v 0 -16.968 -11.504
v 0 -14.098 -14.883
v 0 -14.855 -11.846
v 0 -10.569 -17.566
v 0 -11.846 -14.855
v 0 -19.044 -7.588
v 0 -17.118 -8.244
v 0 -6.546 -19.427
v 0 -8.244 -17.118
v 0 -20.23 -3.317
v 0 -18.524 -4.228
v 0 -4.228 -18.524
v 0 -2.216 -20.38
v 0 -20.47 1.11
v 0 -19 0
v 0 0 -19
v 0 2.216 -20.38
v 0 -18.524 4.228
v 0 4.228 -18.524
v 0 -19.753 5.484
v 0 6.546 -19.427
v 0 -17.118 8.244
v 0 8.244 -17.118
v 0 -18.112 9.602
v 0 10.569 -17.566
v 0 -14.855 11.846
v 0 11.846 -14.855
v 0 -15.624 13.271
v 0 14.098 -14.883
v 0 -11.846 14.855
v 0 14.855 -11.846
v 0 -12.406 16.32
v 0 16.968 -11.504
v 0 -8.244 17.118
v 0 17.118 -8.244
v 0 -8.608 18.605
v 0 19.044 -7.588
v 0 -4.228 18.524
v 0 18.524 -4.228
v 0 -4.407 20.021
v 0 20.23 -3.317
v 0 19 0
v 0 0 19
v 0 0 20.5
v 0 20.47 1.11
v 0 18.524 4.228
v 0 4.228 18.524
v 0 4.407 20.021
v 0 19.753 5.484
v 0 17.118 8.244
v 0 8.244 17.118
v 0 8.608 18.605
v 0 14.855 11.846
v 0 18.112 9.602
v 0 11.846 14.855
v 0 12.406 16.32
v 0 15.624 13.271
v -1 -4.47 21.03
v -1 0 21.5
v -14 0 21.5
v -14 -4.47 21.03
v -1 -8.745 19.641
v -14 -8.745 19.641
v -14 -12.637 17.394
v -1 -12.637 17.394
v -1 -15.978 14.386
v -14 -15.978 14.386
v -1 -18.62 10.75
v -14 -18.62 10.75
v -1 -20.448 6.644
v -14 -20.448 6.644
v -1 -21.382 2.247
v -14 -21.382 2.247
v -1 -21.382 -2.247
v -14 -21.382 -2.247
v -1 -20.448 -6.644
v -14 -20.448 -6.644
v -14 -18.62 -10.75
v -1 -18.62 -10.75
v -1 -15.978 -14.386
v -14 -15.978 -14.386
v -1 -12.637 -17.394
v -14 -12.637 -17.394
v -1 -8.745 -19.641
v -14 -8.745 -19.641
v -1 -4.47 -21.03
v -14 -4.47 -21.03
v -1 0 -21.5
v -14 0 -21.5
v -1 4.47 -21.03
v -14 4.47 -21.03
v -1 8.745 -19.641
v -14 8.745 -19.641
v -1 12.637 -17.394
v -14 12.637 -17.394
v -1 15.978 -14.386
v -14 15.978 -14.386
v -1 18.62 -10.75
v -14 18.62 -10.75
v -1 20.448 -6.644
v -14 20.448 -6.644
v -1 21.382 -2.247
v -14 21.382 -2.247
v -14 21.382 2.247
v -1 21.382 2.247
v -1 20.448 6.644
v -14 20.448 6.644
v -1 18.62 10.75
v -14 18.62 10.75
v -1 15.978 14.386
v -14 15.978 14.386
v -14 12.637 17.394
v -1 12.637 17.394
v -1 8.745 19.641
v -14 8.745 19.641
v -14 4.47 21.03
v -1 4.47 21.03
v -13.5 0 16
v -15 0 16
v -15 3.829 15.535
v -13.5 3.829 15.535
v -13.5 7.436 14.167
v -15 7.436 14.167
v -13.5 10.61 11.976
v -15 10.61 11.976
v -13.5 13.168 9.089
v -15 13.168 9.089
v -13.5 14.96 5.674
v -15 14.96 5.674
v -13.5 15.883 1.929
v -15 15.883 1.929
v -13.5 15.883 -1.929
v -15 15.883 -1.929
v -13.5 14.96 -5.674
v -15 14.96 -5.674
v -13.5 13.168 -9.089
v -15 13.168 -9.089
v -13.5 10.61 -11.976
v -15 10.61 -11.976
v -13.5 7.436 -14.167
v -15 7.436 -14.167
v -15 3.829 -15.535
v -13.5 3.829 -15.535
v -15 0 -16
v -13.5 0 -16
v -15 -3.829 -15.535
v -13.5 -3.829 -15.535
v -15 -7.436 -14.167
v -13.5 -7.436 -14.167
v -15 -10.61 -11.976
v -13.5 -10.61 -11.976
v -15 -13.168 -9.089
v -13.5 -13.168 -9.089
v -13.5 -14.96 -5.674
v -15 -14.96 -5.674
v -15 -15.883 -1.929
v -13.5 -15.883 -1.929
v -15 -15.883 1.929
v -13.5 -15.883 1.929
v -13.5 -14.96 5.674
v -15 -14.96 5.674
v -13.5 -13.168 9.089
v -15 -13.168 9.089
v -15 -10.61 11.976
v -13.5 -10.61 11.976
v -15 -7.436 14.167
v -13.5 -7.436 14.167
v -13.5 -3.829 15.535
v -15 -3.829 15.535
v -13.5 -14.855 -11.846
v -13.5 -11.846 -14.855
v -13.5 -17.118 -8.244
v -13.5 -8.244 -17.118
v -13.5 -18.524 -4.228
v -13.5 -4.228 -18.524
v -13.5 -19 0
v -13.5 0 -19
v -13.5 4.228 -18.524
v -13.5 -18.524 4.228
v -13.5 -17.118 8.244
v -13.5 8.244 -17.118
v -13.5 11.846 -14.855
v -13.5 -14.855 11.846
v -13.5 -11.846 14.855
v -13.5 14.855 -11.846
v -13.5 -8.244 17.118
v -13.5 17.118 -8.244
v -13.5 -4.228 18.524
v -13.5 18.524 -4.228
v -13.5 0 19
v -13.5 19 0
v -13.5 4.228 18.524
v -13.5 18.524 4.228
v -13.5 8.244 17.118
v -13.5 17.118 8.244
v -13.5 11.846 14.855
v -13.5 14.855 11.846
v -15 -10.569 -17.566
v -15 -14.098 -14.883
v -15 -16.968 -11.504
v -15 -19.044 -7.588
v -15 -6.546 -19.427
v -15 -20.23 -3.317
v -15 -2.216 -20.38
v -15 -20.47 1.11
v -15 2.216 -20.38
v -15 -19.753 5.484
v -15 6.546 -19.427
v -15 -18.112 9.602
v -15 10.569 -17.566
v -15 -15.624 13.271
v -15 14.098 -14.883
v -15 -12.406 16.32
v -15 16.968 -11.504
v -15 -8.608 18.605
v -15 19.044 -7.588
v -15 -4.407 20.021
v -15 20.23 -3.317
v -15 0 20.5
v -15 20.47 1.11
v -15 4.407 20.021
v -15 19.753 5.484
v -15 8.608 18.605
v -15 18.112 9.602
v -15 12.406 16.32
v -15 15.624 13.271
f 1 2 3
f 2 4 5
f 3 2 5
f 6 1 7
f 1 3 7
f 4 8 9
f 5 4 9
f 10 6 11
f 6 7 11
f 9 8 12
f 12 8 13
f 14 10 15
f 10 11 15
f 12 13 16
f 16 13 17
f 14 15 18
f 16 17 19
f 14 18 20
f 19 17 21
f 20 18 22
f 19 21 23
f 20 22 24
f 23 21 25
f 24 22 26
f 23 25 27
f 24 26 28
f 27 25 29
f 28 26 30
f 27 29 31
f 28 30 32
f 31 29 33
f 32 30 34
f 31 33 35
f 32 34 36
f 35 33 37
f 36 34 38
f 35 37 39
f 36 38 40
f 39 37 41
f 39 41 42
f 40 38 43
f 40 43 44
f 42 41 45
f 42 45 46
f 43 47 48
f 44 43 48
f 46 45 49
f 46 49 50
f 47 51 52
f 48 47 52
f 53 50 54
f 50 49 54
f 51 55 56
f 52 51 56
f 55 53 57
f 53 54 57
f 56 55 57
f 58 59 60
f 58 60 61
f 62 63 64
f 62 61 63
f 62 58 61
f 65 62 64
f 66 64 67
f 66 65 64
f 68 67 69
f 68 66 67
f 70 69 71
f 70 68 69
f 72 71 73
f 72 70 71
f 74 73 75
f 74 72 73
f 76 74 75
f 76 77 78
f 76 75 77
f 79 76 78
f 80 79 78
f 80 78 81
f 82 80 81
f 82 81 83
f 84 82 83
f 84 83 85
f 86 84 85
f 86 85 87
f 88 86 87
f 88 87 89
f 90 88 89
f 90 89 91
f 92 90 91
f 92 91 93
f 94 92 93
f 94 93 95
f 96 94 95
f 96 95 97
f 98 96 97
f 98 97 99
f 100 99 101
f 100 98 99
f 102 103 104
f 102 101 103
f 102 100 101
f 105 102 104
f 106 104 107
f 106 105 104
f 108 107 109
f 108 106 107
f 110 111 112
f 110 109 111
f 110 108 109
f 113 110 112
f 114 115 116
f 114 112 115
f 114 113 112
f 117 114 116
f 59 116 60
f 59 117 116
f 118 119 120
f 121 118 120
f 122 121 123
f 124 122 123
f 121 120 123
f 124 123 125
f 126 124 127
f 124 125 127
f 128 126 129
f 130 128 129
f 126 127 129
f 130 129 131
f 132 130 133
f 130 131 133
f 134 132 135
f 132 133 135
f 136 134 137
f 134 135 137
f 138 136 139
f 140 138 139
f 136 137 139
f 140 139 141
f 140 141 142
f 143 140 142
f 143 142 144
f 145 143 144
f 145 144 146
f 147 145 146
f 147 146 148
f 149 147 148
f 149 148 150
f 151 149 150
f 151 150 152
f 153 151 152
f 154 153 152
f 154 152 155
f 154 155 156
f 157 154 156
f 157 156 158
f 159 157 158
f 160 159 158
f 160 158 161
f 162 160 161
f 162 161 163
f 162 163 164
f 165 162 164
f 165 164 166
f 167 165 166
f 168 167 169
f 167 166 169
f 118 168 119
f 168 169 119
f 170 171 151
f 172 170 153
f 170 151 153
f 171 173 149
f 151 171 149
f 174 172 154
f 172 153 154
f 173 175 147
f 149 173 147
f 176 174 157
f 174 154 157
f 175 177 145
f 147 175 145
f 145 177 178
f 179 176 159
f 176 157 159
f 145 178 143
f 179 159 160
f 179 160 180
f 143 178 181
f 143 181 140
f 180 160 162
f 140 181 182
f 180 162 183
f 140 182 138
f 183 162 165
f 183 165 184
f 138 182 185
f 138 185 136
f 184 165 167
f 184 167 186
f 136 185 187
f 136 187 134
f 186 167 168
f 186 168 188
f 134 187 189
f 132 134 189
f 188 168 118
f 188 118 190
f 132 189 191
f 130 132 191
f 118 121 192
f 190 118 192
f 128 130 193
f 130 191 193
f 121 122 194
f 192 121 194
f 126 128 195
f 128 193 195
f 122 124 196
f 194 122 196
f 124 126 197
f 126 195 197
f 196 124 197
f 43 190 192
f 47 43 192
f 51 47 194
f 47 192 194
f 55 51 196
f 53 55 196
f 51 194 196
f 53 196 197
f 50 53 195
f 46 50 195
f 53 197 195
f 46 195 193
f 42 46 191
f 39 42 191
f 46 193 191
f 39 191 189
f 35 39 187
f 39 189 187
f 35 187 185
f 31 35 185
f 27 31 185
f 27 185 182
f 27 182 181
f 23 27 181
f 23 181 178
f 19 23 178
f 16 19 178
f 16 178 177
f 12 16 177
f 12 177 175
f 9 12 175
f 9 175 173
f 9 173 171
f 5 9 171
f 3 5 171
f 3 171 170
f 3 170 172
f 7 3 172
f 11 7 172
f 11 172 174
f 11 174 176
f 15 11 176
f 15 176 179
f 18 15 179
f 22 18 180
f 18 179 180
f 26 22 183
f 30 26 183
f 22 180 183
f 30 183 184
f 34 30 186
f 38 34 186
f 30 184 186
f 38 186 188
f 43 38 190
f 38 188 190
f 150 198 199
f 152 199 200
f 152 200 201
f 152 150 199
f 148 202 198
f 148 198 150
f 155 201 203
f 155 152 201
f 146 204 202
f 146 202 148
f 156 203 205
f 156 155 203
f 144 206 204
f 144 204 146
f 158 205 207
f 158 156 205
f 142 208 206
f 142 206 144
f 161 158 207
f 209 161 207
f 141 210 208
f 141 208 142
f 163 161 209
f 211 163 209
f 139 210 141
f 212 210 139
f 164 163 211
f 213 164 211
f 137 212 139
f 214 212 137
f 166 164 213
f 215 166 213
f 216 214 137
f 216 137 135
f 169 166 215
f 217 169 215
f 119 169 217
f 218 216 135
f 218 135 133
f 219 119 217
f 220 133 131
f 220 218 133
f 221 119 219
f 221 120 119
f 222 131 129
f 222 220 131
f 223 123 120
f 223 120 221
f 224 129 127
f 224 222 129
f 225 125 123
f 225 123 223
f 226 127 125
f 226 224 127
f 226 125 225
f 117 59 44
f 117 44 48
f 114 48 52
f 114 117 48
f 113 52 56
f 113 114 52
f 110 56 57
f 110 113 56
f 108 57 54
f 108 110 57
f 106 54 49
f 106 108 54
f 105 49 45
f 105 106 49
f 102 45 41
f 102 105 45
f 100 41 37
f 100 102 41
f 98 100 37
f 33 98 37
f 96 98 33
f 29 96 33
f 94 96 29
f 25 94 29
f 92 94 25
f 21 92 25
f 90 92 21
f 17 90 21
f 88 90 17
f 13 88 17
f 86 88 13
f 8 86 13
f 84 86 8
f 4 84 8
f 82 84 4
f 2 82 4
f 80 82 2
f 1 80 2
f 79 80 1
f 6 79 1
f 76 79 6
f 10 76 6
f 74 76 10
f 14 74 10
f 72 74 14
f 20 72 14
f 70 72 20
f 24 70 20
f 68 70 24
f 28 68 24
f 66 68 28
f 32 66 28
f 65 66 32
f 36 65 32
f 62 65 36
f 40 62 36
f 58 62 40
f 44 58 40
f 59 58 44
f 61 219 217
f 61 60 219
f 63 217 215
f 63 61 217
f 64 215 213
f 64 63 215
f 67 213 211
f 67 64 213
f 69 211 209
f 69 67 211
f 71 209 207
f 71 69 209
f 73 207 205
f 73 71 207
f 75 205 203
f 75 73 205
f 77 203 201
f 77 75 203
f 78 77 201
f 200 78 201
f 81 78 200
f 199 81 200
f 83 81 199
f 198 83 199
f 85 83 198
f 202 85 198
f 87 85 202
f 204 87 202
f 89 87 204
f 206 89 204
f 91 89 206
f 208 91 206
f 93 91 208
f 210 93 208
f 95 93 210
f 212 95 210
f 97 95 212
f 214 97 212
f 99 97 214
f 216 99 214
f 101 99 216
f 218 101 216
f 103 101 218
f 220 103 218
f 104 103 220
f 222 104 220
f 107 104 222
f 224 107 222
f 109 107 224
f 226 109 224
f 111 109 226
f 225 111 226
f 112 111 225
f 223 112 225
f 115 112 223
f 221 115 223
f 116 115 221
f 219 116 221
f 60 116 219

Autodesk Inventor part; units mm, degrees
ref_plane "YZ Plane" through (0, 0, 0) normal (1, 0, 0) x (0, 1, 0)
ref_plane "XZ Plane" through (0, 0, 0) normal (0, 1, 0) x (-1, 0, 0)
ref_plane "XY Plane" through (0, 0, 0) normal (0, 0, 1) x (1, 0, 0)
sketch "Sketch1" plane through (0, 0, 0) normal (0, 1, 0) x (-1, 0, 0)
  line L0 (0, 0) -> (15, 0)
  line L1 (15, 16) -> (15, 21.5)
  line L2 (15, 21.5) -> (0, 21.5)
  line L3 (0, 21.5) -> (0, 19)
  line L4 (0, 19) -> (13.5, 19)
  line L5 (13.5, 19) -> (13.5, 16)
  line L6 (13.5, 16) -> (15, 16)
  dimension "d0" = 38
  dimension "d1" = 2.5
  dimension "d2" = 15
  dimension "d3" = 1.5
  dimension "d6" = 32
revolve "Revolution1" add sketch "Sketch1" angle 360 about axis through (0, 0, 0) along (-1, 0, 0)
chamfer "Chamfer1" distance 1 angle 45 2 edges at (0, 0, -21.5) (-15, 0, -21.5)
properties part number "031" material "Aluminum 6061"
